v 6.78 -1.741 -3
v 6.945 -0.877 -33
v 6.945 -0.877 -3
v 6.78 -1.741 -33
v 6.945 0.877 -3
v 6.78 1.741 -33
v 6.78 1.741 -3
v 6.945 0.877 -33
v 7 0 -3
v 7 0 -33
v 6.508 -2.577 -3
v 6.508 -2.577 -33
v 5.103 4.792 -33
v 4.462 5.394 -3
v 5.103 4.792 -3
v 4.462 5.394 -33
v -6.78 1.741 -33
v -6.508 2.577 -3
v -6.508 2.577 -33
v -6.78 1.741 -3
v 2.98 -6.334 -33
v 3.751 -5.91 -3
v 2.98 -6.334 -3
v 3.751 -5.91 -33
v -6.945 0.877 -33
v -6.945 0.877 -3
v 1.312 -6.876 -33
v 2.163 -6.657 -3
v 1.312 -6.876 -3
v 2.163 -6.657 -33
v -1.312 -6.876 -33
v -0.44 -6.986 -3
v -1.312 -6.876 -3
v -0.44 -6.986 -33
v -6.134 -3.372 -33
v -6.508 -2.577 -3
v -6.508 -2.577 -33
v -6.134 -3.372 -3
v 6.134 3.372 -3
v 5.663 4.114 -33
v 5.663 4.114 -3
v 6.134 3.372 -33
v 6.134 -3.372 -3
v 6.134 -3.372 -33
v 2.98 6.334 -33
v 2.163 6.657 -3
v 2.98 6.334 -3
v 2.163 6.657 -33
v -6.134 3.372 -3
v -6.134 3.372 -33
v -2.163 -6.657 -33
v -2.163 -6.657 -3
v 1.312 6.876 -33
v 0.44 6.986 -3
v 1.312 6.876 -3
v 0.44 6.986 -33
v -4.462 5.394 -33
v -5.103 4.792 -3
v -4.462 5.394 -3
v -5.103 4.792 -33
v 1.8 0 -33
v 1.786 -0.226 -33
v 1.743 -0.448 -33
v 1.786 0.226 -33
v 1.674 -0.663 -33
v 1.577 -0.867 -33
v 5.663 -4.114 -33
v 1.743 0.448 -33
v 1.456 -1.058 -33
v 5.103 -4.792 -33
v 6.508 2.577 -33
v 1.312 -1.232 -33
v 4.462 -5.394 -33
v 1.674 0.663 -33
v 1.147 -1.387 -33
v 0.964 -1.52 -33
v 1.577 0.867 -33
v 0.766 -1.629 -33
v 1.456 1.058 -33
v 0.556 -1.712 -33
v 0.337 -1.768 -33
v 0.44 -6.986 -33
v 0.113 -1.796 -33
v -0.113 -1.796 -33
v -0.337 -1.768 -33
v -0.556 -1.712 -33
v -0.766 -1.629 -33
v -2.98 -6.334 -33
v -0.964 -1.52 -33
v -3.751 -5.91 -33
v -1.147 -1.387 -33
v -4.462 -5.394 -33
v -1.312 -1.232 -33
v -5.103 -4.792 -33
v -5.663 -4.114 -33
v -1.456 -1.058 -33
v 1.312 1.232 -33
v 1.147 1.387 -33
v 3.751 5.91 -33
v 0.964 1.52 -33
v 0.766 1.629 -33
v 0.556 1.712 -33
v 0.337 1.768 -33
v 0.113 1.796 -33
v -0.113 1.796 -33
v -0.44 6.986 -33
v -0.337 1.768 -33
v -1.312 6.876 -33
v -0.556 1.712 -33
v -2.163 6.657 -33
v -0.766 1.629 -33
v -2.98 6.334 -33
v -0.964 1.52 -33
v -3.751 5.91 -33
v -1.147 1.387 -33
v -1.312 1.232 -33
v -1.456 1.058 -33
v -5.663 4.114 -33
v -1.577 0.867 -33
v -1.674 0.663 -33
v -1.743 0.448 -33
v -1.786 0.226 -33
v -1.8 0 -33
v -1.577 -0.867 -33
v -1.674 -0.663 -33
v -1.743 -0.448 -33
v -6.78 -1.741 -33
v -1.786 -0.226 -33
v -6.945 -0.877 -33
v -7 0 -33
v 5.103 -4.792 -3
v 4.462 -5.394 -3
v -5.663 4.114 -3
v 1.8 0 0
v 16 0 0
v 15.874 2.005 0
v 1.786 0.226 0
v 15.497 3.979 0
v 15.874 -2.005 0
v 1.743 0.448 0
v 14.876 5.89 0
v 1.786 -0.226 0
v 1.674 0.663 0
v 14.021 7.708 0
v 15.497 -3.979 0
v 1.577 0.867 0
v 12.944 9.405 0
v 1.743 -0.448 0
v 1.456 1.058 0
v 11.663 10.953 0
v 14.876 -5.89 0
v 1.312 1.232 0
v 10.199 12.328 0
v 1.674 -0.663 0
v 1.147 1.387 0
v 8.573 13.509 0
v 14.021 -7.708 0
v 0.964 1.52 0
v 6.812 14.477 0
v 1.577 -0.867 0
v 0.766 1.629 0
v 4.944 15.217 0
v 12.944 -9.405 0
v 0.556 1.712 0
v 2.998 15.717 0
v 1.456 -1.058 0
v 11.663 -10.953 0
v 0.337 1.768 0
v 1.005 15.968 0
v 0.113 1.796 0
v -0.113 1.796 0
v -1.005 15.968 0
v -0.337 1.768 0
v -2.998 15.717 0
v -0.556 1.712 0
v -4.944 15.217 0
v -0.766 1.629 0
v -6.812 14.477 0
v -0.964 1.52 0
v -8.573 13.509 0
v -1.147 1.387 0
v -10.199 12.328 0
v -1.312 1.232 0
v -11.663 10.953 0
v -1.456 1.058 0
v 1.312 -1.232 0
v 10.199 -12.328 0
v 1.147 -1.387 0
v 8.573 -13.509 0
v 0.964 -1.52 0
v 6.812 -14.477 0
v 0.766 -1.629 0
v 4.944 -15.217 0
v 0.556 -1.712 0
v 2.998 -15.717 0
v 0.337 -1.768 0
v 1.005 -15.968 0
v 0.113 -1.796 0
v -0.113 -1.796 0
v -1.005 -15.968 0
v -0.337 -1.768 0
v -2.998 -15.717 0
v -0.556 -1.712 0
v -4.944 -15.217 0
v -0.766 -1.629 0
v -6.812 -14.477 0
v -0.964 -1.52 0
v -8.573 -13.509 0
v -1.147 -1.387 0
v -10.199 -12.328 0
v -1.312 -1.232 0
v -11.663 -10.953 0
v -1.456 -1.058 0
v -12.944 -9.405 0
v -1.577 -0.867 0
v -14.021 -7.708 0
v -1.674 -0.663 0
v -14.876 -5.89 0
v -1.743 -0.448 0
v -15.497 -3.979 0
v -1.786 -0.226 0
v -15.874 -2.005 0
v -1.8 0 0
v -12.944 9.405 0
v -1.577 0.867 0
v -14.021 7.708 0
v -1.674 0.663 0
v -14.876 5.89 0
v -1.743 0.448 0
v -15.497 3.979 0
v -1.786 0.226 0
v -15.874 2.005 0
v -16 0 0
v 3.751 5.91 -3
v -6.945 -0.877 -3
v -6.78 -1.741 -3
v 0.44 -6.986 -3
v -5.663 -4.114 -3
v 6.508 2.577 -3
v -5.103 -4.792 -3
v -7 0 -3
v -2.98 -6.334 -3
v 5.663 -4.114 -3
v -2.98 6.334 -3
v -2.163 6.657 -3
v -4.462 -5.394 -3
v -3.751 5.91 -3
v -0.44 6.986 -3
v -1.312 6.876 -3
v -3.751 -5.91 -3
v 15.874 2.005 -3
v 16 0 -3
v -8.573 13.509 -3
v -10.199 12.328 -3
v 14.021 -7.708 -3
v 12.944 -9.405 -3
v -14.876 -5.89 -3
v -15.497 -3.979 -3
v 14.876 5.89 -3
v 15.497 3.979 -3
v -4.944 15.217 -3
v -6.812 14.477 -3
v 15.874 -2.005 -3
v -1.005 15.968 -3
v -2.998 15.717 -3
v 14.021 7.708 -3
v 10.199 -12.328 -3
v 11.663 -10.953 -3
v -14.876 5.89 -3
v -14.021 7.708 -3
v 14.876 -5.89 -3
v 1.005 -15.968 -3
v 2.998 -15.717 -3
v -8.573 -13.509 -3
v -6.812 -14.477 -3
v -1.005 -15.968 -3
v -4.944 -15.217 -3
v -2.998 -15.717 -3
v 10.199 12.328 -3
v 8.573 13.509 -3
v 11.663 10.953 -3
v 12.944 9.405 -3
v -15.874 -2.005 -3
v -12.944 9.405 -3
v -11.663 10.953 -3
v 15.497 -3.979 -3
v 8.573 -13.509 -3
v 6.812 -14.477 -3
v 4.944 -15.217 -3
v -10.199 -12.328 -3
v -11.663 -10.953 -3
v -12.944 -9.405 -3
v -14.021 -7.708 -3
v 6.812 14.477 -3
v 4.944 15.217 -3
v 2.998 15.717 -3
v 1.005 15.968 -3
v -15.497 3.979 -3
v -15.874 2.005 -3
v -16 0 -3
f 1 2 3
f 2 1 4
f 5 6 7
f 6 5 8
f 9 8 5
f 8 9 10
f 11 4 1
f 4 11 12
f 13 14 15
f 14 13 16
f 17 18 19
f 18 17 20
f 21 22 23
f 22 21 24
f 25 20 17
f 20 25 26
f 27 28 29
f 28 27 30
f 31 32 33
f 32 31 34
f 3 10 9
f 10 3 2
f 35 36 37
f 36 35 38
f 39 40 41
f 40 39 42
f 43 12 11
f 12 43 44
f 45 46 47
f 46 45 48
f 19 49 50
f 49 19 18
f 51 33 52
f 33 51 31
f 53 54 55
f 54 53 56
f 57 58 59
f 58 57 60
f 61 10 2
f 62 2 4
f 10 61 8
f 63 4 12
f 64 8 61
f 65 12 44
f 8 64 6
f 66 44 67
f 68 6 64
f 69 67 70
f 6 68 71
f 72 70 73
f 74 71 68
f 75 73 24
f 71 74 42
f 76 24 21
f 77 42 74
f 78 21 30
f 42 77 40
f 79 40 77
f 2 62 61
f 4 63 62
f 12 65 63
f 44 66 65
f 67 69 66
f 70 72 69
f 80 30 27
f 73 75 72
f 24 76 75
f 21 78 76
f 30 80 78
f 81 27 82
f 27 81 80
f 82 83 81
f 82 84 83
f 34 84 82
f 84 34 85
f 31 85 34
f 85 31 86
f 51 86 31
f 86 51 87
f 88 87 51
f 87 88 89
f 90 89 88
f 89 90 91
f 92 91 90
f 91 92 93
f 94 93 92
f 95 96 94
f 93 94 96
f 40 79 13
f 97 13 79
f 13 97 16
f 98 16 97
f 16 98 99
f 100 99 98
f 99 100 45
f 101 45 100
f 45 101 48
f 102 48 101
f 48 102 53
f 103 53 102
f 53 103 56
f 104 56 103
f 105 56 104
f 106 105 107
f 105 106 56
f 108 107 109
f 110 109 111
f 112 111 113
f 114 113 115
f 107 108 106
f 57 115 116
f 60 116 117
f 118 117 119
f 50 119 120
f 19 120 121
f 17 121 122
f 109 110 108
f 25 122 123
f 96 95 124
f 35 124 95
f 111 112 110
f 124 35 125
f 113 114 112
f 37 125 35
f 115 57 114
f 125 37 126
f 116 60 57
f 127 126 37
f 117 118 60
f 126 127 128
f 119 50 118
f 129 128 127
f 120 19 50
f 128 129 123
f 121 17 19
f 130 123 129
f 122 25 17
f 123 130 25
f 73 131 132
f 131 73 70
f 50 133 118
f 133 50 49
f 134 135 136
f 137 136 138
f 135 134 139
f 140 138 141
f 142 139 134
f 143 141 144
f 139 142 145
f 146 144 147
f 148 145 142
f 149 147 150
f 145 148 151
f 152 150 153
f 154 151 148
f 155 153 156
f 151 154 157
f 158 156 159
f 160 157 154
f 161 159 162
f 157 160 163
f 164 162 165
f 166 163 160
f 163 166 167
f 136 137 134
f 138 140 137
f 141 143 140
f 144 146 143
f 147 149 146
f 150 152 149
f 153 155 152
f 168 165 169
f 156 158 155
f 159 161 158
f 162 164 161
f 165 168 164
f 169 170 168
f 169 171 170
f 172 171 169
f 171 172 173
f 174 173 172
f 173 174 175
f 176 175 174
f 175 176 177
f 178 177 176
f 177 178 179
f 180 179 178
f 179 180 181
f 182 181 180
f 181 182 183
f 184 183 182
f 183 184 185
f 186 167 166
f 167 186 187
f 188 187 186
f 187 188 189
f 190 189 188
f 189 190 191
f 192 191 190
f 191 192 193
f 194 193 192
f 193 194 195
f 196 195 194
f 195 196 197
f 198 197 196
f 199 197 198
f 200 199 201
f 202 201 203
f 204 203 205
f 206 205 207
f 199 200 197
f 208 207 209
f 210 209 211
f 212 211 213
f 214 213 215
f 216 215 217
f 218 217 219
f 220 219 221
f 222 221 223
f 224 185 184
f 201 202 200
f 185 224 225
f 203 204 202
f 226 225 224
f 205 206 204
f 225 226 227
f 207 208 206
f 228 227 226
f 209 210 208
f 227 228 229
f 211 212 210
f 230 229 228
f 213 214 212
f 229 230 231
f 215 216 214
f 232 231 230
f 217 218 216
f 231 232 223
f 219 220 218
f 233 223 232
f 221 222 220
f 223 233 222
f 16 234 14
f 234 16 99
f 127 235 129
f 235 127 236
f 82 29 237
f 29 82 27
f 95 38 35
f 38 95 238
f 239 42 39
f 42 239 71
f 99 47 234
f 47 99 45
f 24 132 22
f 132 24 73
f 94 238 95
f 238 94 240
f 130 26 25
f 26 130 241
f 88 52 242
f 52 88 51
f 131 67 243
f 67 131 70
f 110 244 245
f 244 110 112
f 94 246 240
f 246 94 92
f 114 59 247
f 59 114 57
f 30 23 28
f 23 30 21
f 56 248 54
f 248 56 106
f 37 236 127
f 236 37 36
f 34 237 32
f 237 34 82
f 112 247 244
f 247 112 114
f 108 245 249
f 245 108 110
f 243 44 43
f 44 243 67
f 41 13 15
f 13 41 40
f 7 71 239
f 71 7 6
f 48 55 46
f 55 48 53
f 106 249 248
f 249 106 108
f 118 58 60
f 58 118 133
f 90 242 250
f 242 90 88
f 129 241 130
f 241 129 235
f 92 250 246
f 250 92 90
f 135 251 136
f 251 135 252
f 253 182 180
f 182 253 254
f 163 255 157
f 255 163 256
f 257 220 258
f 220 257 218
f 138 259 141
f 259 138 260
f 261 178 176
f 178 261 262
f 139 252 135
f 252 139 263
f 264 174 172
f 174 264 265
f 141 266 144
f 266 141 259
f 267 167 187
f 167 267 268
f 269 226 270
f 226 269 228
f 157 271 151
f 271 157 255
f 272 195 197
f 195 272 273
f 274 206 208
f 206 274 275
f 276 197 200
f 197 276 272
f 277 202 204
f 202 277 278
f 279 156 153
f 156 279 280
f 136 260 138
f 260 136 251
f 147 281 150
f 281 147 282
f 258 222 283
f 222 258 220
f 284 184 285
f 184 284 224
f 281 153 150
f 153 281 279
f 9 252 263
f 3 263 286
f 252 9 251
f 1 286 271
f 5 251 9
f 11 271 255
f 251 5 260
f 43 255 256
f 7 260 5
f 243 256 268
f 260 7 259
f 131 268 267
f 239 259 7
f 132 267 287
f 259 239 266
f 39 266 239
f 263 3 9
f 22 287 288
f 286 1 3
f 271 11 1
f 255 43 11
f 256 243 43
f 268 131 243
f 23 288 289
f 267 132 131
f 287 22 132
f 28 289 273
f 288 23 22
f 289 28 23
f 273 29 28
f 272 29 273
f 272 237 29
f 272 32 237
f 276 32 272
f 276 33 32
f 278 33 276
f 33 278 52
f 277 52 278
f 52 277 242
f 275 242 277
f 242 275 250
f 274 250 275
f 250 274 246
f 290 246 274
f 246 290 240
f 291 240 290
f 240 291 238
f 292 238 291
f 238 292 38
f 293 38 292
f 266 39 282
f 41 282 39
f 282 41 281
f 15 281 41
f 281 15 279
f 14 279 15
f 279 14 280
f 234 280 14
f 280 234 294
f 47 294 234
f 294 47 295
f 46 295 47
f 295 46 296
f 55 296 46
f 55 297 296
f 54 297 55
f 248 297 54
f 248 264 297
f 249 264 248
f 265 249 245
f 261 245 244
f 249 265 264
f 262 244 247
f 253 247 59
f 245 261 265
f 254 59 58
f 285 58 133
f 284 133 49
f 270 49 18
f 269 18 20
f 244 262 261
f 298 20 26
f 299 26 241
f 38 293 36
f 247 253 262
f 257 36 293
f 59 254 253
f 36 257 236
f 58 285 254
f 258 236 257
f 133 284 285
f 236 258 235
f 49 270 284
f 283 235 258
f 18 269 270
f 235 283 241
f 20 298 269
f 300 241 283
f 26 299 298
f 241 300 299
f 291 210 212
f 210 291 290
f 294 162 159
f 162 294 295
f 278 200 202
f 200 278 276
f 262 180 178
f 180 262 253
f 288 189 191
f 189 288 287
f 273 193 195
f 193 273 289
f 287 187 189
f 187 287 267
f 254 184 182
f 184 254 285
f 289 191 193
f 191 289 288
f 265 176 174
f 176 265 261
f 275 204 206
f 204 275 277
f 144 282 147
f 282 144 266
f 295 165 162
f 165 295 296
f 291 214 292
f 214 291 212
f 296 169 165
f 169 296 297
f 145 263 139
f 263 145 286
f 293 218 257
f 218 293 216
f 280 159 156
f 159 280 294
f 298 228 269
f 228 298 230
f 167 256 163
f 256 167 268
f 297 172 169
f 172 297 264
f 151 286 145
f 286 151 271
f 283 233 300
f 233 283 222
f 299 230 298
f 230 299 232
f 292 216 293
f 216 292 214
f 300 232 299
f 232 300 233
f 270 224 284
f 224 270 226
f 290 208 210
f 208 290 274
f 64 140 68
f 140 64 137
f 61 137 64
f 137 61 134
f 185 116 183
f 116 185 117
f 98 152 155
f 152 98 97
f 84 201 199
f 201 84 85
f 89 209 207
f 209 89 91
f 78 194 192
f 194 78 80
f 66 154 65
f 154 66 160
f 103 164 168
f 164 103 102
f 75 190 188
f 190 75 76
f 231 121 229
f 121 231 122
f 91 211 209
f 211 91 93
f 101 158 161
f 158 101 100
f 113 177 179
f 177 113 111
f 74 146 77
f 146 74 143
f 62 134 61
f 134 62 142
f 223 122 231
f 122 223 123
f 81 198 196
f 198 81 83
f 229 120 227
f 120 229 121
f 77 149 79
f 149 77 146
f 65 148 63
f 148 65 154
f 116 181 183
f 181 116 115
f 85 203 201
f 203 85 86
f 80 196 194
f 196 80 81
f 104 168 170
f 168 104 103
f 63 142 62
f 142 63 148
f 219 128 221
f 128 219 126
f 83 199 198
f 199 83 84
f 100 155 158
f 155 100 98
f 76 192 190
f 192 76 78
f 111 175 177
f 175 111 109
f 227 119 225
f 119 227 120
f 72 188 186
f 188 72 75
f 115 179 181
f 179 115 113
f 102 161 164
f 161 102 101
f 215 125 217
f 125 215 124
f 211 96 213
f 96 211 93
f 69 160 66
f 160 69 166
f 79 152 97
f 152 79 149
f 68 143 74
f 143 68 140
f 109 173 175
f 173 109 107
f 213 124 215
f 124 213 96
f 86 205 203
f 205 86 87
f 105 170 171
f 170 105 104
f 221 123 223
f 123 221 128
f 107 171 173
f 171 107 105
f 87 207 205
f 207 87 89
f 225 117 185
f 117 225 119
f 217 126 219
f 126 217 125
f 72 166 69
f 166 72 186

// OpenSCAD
$fn = 50;


difference() {
	union() {
		translate(v = [0, 0, -33.0000000000]) {
			cylinder(h = 33, r = 7.0000000000);
		}
		translate(v = [0, 0, -3.0000000000]) {
			cylinder(h = 3, r = 16.0000000000);
		}
	}
	union() {
		#translate(v = [0, 0, -33]) {
			cylinder(h = 33, r = 1.8000000000);
		}
	}
}
